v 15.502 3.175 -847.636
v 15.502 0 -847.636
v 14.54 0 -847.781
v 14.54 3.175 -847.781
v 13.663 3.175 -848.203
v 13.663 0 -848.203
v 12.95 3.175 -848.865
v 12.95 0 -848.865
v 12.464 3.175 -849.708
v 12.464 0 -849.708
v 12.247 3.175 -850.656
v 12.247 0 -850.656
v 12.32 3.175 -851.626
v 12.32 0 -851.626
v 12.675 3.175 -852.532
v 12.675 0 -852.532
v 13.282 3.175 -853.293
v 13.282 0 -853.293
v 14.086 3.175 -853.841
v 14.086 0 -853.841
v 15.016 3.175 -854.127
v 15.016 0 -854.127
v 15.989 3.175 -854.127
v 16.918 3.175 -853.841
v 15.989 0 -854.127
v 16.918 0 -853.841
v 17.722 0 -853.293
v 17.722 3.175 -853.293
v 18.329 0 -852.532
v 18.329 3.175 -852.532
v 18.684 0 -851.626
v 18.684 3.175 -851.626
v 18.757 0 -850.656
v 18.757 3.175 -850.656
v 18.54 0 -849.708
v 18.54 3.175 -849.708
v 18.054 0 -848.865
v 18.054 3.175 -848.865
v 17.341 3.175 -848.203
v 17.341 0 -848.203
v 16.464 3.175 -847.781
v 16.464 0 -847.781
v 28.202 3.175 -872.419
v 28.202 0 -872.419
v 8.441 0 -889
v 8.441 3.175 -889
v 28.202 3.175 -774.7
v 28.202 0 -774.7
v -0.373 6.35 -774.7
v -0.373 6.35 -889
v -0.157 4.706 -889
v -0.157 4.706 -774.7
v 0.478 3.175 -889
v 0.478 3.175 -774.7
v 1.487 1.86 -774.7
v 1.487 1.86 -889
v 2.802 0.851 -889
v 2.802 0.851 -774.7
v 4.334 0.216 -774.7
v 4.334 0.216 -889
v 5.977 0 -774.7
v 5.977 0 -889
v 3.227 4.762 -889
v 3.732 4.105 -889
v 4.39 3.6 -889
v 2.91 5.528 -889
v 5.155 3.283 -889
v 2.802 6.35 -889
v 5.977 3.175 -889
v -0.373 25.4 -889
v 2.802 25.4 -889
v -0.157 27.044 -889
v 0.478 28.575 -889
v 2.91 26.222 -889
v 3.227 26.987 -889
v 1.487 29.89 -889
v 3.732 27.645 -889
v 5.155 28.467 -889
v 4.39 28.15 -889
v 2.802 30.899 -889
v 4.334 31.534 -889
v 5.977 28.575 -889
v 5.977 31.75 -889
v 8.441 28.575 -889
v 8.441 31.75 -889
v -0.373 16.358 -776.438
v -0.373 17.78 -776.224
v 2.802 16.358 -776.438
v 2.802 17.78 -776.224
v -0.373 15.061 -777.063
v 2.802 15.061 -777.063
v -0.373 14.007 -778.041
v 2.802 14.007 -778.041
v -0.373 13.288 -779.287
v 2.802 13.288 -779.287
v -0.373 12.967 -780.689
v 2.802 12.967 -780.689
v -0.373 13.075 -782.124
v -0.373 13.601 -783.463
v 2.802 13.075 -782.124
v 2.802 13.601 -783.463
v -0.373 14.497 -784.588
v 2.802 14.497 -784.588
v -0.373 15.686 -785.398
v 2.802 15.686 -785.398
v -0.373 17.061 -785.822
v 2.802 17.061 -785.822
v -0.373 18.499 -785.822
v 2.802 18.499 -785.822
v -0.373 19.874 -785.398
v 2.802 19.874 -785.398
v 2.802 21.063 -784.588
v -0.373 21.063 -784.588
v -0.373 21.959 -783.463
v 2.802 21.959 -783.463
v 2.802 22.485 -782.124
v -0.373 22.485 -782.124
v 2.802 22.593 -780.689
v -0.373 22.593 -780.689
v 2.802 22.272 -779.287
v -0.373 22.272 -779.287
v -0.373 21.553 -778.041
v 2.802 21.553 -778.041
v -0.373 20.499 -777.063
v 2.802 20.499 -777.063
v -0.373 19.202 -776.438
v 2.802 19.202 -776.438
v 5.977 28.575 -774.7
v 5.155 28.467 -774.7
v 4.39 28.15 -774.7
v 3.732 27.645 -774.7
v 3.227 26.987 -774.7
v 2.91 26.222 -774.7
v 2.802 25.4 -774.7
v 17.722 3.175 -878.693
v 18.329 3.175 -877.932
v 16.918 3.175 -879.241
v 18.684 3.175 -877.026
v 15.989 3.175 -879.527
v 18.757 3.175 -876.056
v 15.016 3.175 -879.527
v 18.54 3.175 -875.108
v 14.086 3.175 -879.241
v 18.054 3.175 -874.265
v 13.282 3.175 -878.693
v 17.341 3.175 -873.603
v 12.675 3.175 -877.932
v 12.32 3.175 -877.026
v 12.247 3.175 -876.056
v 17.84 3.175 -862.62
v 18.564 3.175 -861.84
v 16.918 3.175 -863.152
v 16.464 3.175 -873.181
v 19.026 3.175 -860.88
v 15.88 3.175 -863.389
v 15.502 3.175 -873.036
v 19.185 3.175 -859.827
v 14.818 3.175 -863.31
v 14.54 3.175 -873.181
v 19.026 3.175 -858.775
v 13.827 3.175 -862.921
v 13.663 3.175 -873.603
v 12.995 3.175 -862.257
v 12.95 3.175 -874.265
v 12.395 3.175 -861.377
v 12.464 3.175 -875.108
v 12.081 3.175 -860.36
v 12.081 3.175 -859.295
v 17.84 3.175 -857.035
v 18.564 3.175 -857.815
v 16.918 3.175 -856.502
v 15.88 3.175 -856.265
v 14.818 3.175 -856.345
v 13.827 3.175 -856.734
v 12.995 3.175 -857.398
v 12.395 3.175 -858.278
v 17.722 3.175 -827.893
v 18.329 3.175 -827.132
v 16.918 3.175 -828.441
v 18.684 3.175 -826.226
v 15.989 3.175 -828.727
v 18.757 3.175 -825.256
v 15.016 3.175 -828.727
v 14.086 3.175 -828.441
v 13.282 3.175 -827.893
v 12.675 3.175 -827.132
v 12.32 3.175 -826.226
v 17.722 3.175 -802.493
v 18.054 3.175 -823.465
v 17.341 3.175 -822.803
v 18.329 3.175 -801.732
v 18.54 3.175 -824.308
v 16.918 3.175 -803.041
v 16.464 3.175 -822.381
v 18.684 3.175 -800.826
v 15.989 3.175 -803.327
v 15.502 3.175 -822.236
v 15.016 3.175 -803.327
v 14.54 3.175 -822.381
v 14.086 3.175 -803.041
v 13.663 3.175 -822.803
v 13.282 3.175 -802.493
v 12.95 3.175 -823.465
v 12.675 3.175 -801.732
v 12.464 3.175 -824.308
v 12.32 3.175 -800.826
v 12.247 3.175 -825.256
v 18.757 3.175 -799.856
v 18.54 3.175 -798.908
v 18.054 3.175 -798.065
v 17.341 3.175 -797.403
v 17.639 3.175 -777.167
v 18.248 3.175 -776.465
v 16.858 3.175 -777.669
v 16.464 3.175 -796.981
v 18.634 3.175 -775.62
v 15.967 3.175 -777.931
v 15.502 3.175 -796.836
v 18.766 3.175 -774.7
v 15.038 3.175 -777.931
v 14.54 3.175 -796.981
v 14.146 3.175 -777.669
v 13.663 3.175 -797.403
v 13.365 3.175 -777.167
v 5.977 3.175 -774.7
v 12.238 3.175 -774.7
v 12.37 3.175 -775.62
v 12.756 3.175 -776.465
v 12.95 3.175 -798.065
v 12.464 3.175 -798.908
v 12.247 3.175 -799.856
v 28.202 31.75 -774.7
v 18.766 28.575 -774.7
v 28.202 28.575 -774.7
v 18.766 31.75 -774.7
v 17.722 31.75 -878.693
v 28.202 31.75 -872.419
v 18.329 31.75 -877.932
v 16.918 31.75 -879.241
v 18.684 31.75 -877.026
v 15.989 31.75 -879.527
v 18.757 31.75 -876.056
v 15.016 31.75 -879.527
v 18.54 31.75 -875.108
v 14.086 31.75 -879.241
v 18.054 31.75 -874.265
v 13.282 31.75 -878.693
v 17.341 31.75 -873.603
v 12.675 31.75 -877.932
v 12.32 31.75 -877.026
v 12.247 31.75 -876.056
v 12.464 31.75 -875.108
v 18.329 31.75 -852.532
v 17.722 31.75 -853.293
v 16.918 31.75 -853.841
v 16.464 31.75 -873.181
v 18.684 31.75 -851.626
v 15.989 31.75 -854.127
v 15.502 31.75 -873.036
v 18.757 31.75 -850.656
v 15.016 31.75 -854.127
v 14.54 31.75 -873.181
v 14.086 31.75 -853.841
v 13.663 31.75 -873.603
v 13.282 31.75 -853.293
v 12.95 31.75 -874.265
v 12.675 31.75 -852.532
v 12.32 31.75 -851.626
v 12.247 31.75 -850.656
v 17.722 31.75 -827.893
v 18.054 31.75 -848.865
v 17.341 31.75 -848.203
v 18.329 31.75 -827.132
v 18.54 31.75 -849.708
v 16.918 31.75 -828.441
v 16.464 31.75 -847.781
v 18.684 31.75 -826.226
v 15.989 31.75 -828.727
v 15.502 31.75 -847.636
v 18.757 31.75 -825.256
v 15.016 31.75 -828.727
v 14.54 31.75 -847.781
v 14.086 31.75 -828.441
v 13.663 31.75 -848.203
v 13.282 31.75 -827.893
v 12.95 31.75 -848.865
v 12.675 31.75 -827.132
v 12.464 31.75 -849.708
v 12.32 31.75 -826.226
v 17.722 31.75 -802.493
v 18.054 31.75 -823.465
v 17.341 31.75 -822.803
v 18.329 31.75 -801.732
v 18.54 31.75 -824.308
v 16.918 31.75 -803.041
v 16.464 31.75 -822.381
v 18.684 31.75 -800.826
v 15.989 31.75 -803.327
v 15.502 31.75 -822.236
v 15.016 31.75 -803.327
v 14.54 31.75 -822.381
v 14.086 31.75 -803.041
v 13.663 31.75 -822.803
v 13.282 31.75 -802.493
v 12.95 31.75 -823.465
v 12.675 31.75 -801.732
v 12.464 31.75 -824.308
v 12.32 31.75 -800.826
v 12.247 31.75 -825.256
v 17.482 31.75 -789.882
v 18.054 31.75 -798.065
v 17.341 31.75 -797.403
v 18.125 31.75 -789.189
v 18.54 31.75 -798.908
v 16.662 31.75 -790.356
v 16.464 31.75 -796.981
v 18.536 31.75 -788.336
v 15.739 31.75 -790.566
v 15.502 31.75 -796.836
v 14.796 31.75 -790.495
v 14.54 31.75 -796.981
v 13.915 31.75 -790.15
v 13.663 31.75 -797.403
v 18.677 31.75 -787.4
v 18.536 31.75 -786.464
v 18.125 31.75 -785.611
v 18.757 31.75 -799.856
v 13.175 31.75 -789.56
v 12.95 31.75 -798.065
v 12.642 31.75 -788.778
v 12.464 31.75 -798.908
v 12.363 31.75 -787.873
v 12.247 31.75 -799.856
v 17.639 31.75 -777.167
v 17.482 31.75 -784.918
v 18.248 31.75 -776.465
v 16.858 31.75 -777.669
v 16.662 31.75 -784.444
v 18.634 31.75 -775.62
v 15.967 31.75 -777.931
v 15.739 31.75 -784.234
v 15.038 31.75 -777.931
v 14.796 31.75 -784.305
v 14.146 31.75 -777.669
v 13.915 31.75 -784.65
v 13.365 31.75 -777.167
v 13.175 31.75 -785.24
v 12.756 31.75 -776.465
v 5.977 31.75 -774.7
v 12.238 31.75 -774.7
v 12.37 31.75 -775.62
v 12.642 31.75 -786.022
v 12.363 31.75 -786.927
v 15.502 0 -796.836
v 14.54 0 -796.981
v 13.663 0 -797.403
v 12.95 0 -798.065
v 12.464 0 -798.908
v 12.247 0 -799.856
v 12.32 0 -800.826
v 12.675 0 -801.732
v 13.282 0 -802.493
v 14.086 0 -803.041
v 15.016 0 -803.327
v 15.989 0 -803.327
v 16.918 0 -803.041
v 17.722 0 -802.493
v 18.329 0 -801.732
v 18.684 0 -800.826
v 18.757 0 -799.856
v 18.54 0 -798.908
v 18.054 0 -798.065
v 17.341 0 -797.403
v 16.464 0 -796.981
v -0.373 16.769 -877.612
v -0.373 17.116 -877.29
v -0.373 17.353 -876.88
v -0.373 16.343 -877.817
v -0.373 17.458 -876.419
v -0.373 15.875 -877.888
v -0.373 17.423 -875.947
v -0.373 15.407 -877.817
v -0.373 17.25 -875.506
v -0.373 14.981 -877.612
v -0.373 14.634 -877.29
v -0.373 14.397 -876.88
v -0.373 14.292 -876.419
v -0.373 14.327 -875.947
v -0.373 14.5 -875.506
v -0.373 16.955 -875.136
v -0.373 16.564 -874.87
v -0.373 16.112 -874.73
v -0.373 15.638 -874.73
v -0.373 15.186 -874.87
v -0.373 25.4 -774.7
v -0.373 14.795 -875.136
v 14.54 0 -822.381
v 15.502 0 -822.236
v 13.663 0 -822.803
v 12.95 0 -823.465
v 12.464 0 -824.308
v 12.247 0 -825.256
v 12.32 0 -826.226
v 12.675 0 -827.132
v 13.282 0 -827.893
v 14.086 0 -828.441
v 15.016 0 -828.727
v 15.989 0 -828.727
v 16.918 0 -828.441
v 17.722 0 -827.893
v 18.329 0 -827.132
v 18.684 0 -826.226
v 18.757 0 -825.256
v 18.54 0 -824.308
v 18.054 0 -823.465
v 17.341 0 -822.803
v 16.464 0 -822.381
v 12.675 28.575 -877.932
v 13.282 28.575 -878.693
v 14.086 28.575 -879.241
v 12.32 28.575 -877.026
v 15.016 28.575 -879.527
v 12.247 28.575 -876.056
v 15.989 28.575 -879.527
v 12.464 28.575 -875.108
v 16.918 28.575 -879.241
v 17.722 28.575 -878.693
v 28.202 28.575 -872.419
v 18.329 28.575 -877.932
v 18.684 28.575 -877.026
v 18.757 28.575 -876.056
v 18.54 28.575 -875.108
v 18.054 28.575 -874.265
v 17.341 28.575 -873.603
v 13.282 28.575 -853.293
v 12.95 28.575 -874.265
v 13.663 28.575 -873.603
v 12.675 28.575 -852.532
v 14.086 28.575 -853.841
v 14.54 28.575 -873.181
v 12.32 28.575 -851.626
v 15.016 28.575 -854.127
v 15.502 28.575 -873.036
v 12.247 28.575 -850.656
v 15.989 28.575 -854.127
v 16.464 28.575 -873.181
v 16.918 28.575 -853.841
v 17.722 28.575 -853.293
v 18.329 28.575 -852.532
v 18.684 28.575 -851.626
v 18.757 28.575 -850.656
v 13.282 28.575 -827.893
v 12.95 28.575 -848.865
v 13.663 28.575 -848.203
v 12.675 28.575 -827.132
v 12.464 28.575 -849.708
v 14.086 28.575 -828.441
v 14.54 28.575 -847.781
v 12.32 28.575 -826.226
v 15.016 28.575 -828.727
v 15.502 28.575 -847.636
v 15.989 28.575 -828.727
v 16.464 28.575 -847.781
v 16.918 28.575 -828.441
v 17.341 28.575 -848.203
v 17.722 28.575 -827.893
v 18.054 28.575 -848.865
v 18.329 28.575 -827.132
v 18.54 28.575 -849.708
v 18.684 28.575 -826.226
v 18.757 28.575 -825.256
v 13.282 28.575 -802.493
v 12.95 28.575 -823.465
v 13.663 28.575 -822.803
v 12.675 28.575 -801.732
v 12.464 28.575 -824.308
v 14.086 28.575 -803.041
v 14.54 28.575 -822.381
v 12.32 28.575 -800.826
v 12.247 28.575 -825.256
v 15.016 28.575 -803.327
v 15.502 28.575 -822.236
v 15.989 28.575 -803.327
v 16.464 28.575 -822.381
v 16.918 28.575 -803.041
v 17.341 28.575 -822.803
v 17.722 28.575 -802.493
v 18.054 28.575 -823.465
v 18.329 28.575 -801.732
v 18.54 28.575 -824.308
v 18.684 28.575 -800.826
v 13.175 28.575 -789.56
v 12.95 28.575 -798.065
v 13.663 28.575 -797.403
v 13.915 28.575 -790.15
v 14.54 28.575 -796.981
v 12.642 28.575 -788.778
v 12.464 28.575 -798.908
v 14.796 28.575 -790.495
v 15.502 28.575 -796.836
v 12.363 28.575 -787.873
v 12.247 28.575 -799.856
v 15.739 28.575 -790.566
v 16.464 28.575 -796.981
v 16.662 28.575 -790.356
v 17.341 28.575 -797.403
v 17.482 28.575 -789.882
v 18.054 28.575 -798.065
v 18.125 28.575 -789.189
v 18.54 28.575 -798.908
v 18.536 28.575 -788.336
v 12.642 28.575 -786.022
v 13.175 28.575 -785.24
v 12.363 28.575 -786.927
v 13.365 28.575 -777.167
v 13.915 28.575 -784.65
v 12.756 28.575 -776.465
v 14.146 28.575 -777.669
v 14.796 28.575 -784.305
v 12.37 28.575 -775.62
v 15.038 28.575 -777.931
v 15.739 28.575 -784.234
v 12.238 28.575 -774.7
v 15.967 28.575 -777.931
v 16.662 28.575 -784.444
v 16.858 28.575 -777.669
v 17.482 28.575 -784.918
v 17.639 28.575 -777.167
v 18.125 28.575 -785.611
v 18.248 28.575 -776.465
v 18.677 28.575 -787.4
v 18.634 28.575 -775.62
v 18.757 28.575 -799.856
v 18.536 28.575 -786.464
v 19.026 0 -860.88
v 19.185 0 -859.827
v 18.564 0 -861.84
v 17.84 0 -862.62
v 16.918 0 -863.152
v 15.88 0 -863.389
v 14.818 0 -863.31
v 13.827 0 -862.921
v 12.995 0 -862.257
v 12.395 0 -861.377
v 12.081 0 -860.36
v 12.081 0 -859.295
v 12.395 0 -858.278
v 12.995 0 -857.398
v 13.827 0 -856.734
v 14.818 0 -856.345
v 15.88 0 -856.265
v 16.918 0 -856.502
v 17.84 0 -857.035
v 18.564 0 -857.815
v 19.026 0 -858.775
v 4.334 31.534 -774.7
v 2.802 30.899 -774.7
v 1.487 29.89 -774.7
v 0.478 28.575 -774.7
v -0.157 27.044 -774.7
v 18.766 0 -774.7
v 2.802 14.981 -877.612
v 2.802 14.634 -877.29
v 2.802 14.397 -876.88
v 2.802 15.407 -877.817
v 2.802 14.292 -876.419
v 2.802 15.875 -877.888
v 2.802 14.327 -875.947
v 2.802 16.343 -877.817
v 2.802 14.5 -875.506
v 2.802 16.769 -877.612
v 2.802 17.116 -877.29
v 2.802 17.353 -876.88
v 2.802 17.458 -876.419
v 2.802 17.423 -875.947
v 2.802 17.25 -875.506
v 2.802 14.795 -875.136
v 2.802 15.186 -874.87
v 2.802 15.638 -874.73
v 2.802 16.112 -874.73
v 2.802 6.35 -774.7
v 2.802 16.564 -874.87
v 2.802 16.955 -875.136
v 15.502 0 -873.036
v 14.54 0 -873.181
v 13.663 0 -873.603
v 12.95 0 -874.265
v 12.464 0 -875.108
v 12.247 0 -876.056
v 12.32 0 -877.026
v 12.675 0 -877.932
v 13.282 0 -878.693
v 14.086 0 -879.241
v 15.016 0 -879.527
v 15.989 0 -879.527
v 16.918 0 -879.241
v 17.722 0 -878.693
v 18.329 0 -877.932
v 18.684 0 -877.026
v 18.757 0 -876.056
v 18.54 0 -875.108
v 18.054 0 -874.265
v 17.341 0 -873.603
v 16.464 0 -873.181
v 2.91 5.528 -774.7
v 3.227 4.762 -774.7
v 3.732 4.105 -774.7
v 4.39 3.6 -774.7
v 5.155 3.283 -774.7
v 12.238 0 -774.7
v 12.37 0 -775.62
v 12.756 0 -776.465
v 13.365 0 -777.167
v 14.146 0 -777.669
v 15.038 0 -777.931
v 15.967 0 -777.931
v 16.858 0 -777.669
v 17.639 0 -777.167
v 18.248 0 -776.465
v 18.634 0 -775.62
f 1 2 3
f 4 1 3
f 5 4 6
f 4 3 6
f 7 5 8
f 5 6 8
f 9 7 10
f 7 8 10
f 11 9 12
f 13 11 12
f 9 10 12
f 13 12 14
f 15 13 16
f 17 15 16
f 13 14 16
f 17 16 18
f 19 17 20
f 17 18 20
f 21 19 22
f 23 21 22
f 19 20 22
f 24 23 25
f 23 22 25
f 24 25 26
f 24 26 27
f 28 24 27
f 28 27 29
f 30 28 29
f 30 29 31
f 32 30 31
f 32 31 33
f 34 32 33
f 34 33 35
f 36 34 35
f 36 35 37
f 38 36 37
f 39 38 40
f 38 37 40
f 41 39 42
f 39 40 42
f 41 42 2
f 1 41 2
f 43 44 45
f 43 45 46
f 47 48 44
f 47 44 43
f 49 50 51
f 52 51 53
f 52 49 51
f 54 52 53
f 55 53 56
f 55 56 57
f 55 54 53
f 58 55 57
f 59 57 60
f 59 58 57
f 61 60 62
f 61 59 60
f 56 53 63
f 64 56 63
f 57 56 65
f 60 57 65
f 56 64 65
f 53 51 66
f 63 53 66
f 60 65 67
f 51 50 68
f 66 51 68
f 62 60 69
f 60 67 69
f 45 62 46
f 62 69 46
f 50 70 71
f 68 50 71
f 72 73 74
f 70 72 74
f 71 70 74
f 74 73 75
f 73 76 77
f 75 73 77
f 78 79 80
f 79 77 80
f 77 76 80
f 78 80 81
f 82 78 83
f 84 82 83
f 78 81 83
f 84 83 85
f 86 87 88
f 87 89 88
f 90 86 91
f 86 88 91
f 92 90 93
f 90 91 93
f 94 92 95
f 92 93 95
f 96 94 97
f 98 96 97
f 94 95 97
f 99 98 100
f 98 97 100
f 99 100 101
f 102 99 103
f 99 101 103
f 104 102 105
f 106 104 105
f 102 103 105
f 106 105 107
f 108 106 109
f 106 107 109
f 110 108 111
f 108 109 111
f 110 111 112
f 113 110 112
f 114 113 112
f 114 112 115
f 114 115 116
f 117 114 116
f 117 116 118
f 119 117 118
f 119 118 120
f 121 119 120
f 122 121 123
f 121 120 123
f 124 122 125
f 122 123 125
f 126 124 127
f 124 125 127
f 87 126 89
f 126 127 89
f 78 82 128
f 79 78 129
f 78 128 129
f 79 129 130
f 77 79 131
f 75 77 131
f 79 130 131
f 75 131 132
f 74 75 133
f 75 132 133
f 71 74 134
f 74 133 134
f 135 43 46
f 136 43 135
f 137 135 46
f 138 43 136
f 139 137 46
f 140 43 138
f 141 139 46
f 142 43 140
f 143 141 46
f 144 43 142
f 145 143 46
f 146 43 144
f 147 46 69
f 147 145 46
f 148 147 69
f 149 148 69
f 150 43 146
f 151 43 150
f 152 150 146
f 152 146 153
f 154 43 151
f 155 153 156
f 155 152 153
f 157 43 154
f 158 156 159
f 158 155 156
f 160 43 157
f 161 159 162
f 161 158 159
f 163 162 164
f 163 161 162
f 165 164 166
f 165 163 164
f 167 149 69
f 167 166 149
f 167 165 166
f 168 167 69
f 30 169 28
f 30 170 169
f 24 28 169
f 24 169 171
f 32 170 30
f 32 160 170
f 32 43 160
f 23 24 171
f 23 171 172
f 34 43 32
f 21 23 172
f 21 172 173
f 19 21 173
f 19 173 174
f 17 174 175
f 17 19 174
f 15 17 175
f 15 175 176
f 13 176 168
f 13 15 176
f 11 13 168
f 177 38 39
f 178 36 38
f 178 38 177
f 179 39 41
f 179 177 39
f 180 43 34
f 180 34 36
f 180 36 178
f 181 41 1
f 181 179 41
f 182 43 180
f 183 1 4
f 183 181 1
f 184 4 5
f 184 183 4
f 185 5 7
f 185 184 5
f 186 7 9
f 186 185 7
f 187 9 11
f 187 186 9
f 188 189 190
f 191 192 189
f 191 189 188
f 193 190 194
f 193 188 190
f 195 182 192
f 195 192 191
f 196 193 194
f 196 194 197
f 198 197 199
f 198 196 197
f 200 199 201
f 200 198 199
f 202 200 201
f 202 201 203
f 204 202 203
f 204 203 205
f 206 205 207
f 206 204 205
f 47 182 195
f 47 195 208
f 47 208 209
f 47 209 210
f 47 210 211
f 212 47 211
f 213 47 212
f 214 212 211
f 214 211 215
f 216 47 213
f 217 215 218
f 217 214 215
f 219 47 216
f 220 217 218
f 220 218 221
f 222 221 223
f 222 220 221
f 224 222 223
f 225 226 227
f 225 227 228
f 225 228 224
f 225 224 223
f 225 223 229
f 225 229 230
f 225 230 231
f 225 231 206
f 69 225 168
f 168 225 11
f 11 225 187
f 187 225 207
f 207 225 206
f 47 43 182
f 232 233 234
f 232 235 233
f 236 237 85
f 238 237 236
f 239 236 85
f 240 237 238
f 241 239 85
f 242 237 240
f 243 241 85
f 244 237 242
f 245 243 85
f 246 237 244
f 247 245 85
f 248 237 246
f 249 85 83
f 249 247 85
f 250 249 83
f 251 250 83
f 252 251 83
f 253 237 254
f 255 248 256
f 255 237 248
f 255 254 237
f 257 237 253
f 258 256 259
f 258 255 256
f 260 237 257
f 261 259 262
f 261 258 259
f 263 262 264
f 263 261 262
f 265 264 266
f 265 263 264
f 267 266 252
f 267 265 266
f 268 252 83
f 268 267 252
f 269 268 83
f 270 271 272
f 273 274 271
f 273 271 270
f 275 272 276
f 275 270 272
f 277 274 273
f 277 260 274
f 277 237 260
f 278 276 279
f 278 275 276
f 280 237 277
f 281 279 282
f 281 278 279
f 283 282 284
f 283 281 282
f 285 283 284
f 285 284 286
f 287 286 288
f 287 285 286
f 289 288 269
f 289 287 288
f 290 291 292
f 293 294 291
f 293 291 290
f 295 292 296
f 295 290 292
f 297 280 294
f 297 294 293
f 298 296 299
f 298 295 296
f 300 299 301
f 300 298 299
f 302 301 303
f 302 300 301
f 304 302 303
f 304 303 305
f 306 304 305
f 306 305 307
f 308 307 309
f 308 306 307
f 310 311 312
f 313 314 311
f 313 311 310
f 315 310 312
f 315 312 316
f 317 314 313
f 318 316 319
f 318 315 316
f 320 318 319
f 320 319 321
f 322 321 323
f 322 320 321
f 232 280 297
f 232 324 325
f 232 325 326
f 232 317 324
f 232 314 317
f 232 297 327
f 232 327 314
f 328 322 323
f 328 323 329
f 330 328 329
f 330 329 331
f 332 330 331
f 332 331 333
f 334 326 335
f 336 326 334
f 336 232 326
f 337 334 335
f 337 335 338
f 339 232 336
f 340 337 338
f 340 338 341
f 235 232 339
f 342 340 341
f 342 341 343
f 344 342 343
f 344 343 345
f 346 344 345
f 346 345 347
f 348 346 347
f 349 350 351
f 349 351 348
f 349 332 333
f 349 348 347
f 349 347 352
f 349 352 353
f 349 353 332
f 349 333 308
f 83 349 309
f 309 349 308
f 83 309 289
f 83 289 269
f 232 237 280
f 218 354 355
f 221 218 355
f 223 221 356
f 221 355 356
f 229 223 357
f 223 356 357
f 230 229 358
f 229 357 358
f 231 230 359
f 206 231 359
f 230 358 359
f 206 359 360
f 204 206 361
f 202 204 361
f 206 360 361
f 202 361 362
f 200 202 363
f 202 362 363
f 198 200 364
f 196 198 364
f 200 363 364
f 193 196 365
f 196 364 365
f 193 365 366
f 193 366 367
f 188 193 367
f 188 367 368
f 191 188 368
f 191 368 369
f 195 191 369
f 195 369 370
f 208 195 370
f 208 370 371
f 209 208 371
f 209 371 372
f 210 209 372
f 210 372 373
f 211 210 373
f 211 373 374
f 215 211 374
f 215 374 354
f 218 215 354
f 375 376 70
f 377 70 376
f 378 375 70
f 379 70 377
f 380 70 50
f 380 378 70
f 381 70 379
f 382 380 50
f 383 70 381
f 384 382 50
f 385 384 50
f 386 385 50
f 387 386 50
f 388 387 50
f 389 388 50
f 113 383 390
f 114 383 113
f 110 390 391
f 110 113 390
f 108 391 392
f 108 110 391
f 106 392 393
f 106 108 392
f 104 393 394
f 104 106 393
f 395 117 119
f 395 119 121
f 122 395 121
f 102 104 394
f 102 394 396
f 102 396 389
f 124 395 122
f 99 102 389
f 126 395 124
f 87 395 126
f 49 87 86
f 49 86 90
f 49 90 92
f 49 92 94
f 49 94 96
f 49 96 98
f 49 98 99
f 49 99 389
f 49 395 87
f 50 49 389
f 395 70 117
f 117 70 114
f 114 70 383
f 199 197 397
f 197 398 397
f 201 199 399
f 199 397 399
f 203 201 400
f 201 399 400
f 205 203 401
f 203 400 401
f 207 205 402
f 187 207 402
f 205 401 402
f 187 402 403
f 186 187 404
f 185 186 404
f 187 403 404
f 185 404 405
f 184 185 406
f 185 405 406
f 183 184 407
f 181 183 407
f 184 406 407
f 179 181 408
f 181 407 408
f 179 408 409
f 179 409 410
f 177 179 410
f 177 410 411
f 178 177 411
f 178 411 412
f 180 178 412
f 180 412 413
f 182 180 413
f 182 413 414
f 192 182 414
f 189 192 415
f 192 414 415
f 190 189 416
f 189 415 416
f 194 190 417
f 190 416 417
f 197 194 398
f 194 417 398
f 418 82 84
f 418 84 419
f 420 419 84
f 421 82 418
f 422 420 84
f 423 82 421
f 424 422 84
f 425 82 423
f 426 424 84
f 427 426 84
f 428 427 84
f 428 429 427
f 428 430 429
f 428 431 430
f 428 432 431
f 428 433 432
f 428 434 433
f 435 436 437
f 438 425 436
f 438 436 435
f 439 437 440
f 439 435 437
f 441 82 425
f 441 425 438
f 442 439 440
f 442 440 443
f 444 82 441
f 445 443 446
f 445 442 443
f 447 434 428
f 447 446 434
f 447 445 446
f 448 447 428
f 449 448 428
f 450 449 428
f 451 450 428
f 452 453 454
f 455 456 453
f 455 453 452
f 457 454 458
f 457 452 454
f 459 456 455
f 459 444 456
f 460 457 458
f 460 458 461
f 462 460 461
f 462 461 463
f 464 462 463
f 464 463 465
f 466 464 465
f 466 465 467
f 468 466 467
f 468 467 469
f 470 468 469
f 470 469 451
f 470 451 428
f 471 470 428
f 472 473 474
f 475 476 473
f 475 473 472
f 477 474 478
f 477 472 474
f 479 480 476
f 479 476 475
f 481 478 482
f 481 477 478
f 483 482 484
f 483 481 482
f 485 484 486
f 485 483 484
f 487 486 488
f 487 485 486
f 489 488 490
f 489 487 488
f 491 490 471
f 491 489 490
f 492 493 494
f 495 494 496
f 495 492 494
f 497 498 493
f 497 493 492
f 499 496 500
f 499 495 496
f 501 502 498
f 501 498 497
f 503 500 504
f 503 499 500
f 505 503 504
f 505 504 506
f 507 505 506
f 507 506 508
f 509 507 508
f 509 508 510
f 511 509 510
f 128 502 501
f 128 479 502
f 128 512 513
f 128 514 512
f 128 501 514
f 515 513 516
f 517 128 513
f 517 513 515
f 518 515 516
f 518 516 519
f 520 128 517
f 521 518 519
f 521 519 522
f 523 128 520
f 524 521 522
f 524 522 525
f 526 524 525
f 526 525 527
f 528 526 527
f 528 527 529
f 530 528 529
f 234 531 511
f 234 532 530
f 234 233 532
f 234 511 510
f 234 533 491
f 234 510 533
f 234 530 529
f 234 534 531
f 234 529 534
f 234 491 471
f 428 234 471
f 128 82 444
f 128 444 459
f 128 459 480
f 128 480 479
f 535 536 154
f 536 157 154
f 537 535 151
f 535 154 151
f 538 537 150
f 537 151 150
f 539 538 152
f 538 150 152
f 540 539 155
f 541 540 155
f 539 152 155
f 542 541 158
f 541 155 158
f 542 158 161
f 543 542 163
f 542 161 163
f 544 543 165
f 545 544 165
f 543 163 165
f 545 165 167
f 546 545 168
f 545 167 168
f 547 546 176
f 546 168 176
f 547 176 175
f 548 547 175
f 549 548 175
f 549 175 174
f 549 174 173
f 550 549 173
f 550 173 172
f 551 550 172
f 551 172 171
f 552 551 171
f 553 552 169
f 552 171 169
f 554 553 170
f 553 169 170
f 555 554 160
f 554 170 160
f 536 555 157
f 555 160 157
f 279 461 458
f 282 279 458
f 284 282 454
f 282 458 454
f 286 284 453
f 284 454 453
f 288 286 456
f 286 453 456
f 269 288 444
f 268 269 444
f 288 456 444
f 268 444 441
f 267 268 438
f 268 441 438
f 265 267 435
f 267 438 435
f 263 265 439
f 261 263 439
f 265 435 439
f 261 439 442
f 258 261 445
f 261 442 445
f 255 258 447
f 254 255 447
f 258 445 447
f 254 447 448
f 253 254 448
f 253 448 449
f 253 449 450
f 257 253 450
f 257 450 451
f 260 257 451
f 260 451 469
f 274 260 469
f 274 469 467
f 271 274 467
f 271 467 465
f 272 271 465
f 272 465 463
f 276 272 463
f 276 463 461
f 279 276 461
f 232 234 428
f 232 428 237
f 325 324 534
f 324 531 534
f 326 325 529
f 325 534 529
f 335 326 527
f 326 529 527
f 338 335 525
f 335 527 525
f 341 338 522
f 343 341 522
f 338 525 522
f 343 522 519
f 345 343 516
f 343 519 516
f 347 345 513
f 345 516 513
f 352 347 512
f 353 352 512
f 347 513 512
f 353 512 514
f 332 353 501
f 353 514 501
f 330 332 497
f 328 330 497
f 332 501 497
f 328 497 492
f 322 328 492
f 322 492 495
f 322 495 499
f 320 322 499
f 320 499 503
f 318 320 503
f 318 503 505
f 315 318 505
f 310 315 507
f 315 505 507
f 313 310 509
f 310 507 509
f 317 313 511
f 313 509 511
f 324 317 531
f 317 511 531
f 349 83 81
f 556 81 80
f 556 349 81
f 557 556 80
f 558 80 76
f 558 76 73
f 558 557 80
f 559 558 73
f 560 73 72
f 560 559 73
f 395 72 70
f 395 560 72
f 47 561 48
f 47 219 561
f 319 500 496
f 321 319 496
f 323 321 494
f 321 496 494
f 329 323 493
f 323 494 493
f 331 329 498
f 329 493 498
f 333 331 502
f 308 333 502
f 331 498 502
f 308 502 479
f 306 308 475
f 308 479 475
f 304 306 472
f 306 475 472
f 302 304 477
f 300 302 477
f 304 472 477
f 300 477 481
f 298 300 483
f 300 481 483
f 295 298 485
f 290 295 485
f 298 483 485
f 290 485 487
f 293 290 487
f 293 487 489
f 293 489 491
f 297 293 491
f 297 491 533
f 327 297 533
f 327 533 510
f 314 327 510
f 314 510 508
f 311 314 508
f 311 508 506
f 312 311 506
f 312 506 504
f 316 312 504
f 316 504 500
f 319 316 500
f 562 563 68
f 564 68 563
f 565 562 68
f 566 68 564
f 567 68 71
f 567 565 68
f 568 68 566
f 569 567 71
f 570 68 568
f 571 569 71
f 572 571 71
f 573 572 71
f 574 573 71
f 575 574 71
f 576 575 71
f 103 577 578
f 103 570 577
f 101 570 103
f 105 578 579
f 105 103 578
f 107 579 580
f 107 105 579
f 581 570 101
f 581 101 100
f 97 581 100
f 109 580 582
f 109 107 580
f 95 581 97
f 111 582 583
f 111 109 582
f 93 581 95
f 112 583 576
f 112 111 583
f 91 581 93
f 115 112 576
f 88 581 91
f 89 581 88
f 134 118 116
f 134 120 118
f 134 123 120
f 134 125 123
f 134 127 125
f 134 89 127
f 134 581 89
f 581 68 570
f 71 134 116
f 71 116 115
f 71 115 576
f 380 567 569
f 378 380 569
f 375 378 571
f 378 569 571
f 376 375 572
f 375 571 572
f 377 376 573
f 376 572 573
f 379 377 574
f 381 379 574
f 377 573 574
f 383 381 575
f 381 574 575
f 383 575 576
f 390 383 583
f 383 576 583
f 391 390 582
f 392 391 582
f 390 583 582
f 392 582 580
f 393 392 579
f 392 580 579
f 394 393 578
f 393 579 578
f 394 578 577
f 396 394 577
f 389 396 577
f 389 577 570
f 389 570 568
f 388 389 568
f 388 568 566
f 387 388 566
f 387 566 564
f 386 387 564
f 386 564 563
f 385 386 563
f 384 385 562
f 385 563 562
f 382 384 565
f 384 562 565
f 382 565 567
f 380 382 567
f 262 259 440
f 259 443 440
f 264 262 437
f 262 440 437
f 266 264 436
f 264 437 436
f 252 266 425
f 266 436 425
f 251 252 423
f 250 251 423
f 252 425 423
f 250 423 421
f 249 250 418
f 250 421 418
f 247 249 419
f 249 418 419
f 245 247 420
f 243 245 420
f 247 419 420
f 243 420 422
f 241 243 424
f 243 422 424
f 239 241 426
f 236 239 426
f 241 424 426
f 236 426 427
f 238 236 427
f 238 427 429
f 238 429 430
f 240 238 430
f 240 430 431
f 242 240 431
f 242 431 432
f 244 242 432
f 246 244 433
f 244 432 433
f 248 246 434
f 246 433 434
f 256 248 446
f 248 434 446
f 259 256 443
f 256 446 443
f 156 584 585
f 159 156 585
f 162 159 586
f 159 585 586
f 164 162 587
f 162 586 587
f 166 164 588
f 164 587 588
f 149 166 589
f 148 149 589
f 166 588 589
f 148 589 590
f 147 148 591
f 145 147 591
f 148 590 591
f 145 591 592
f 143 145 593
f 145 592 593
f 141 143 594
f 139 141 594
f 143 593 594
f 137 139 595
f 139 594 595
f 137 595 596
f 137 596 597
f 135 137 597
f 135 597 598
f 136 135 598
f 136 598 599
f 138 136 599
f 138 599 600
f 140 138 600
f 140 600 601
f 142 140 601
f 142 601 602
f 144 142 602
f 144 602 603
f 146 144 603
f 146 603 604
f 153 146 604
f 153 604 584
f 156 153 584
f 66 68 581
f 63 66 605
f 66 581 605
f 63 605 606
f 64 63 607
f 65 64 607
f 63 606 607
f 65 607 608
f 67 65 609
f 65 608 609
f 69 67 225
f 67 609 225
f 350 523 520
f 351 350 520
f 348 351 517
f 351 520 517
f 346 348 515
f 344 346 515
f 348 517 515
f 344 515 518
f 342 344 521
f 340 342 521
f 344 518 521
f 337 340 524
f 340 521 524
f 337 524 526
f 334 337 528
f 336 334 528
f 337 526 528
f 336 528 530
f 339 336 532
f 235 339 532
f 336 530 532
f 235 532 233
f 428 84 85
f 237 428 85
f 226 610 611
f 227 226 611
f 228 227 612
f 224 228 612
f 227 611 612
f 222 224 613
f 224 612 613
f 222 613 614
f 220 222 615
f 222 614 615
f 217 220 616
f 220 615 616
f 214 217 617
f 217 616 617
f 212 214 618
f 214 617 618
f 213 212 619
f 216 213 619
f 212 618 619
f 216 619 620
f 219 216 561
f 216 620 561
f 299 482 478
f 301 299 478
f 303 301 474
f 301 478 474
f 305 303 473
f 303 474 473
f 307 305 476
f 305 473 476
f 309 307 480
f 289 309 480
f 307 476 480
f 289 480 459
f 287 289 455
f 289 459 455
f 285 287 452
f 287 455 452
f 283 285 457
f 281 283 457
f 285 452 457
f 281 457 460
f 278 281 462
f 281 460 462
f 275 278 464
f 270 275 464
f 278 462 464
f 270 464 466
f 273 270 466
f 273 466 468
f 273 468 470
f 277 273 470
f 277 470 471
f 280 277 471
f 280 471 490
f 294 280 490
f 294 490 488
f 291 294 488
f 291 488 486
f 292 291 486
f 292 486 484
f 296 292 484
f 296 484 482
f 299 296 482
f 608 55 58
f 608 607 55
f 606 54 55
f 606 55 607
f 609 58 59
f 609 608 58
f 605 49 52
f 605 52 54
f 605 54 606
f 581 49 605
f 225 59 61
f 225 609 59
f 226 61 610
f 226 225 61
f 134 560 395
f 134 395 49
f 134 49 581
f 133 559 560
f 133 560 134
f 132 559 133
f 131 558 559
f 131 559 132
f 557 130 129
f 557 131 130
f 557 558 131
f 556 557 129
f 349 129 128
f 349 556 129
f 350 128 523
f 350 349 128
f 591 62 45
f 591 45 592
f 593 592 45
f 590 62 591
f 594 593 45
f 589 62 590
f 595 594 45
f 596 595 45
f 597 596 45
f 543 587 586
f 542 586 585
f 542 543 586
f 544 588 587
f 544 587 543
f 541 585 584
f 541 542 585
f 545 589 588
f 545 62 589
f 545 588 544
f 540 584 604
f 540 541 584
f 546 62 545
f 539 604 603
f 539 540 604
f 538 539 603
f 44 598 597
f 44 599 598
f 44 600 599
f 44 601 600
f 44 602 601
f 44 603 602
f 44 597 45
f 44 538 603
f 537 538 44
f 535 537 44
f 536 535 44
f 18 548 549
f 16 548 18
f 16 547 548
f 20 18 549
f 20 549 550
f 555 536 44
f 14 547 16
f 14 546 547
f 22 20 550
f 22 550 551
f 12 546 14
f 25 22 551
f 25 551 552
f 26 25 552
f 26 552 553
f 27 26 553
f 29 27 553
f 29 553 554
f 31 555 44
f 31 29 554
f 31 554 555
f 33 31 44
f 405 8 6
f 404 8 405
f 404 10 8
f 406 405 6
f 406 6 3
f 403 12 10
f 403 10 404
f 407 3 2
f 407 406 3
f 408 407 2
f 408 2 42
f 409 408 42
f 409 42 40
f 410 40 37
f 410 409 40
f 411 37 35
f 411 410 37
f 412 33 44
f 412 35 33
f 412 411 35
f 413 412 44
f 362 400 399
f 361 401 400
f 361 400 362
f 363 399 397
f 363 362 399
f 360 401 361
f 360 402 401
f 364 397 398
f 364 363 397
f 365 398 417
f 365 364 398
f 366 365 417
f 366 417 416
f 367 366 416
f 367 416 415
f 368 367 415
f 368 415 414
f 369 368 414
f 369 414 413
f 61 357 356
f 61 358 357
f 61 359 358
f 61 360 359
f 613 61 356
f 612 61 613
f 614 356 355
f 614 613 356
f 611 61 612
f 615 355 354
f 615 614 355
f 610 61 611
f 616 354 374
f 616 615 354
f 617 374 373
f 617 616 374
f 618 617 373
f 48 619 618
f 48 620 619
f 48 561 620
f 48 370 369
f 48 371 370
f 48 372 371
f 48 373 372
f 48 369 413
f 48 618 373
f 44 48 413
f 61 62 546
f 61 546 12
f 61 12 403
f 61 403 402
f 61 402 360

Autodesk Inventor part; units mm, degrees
ref_plane "YZ Plane" through (0, 0, 0) normal (1, 0, 0) x (0, 1, 0)
ref_plane "XZ Plane" through (0, 0, 0) normal (0, 1, 0) x (-1, 0, 0)
ref_plane "XY Plane" through (0, 0, 0) normal (0, 0, 1) x (1, 0, 0)
sketch "Sketch1" plane through (0, 0, 0) normal (0, 0, 1) x (1, 0, 0)
  line L0 (5.9771, 0) -> (28.2021, 0)
  line L1 (28.2021, 0) -> (28.2021, 3.175)
  line L2 (28.2021, 3.175) -> (5.9771, 3.175)
  line L3 (2.8021, 6.35) -> (2.8021, 25.4)
  line L4 (5.9771, 28.575) -> (28.2021, 28.575)
  line L5 (28.2021, 28.575) -> (28.2021, 31.75)
  line L6 (28.2021, 31.75) -> (5.9771, 31.75)
  line L7 (-0.3729, 25.4) -> (-0.3729, 6.35)
  arc A0 (5.9771, 28.575) -> (2.8021, 25.4) centre (5.9771, 25.4) ccw
  arc A1 (2.8021, 6.35) -> (5.9771, 3.175) centre (5.9771, 6.35) ccw
  arc A2 (5.9771, 31.75) -> (-0.3729, 25.4) centre (5.9771, 25.4) ccw
  arc A3 (-0.3729, 6.35) -> (5.9771, 0) centre (5.9771, 6.35) ccw
  point P0 (0, 0)
  point P1 (-0.3729, 0)
  point P2 (2.8021, 3.175)
  point P3 (2.8021, 28.575)
  dimension "d0" = 28.575
  dimension "d1" = 3.175
  dimension "d2" = 25.4
  dimension "d3" = 25.4
  dimension "d4" = 3.175
  dimension "d5" = 3.175
  dimension "d6" = 6.35
extrude "Extrusion1" add sketch "Sketch1" against normal blind 889
sketch "Sketch2" plane through (-0.3729, 6.35, 0) normal (-1, 0, 0) x (0, 0, 1)
  line L0 (0, 19.05) -> (-889, 19.05) projected
  line L1 (-228.6, 0) -> (-228.6, 7.9375)
  arc A0 (-228.6, 11.1125) -> (-228.6, 7.9375) centre (-228.6, 9.525) ccw
  line L2 (-228.6, 11.1125) -> (-228.6, 19.05)
  line L3 (-228.6, 19.05) -> (-889, 19.05)
  line L4 (-889, 0) -> (-889, 19.05)
  line L5 (-889, 0) -> (-228.6, 0)
  circle A1 centre (-552.45, 11.43) radius 4.826
  circle A2 centre (-501.65, 11.43) radius 4.826
  circle A3 centre (-387.35, 11.43) radius 4.826
  circle A4 centre (-336.55, 11.43) radius 4.826
  circle A5 centre (-444.5, 7.62) radius 4.826
  circle A6 centre (-730.25, 11.43) radius 4.826
  circle A7 centre (-781.05, 11.43) radius 4.826
  line L6 (0, 25.4) -> (-889, 25.4) construction
  circle A8 centre (-133.35, 11.43) radius 4.826
  circle A9 centre (-82.55, 11.43) radius 4.826
  point P0 (0, -6.35)
  point P1 (-254, 0.852)
  dimension "d10" = 7.62
  dimension "d11" = 3.81
  dimension "d14" = 254
hole "Hole1" at (-0.3729, 17.78, -781.05) at (-0.3729, 17.78, -730.25) at (-0.3729, 17.78, -552.45) at (-0.3729, 17.78, -501.65) at (-0.3729, 13.97, -444.5) at (-0.3729, 17.78, -387.35) at (-0.3729, 17.78, -336.55) at (-0.3729, 17.78, -133.35) at (-0.3729, 17.78, -82.55) direction (1, 0, 0) diameter 9.652 end through all
hole "Hole2" at (-0.3729, 15.875, -228.6) direction (1, 0, 0) diameter 3.175 end through all
sketch "Sketch3" plane through (5.9771, 31.75, 0) normal (0, 1, 0) x (1, 0, 0)
  line L0 (22.225, 889) -> (0, 889) projected
  line L1 (22.225, 0) -> (22.225, 889) projected
  point P0 (-5.9771, 0)
  point P1 (9.525, 876.3)
  dimension "d34" = 12.7
  dimension "d35" = 12.7
hole "Hole3" at (15.5021, 31.75, -876.3) direction (0, -1, 0) diameter 6.5278 end through all
pattern_linear "Rectangular Pattern1" count 35 spacing 25.4 along (0, 0, 1) of "Hole3"
sketch "Sketch4" plane through (0, 0, 0) normal (0, 0, 1) x (1, 0, 0)
  line L0 (28.2021, 0) -> (5.9771, 0) projected
  line L1 (28.2021, 3.175) -> (28.2021, 0) projected
  line L2 (5.9771, 3.175) -> (28.2021, 3.175) projected
  arc A0 (2.8021, 6.35) -> (5.9771, 3.175) centre (5.9771, 6.35) ccw projected
  line L3 (2.8021, 25.4) -> (2.8021, 6.35) projected
  arc A1 (5.9771, 28.575) -> (2.8021, 25.4) centre (5.9771, 25.4) ccw projected
  line L4 (28.2021, 28.575) -> (5.9771, 28.575) projected
  line L5 (28.2021, 31.75) -> (28.2021, 28.575) projected
  line L6 (5.9771, 31.75) -> (28.2021, 31.75) projected
  arc A2 (5.9771, 31.75) -> (-0.3729, 25.4) centre (5.9771, 25.4) ccw projected
  line L7 (-0.3729, 6.35) -> (-0.3729, 25.4) projected
  arc A3 (-0.3729, 6.35) -> (5.9771, 0) centre (5.9771, 6.35) ccw projected
  point P0 (0, 0)
extrude "Extrusion2" cut sketch "Sketch4" against normal blind 774.7
sketch "Sketch5" plane through (15.5021, 3.175, -774.7) normal (0, 1, 0) x (1, 0, 0)
  circle A0 centre (0.1108, 85.1274) radius 3.5719 projected
  circle A1 centre (0.1108, 85.1274) radius 14.2875 construction
  point P0 (-15.5021, -774.7)
extrude "Extrusion3" cut sketch "Sketch5" against normal through all
ref_plane "Work Plane1" through (28.2021, 31.75, -889) normal (0.6428, 0, -0.766) x (0, 1, 0)
sketch "Sketch6" plane through (28.2021, 31.75, -889) normal (0.6428, 0, -0.766) x (0, 1, 0)
  line L0 (-28.575, 73.4706) -> (-31.75, 73.4706) construction
  line L1 (-31.75, 73.4706) -> (-31.75, 0) construction
  line L2 (-31.75, 0) -> (-28.575, 0) construction
  line L3 (-28.575, 73.4706) -> (-28.575, 0) construction
  line L4 (0, 73.4706) -> (-3.175, 73.4706) construction
  line L5 (-3.175, 73.4706) -> (-3.175, 0) construction
  line L6 (-3.175, 0) -> (0, 0) construction
  line L7 (0, 73.4706) -> (0, 0) construction
  line L8 (-31.75, 0) -> (-28.575, 0) projected
  line L9 (-31.75, -17.0253) -> (-31.75, 0) projected
  ellipse E0 centre (-25.4, -17.0253) end of major axis (-19.05, -17.0253) minor radius 4.8644 (-31.75, -17.0253) -> (-25.4, -21.8897) ccw construction
  line L10 (-6.35, -21.8897) -> (-25.4, -21.8897) construction
  ellipse E1 centre (-6.35, -17.0253) end of major axis (-12.7, -17.0253) minor radius 4.8644 (-6.35, -21.8897) -> (0, -17.0253) ccw construction
  line L11 (0, 0) -> (0, -17.0253) projected
  line L12 (-3.175, 0) -> (0, 0) projected
  line L13 (-3.175, -17.0253) -> (-3.175, 0) construction
  ellipse E2 centre (-6.35, -17.0253) end of major axis (-3.175, -17.0253) minor radius 2.4322 (-6.35, -19.4575) -> (-3.175, -17.0253) ccw construction
  line L14 (-25.4, -19.4575) -> (-6.35, -19.4575) construction
  ellipse E3 centre (-25.4, -17.0253) end of major axis (-22.225, -17.0253) minor radius 2.4322 (-28.575, -17.0253) -> (-25.4, -19.4575) ccw construction
  line L15 (-28.575, 0) -> (-28.575, -17.0253) construction
  line L16 (-31.75, 19.05) -> (0, 19.05)
  line L17 (0, 19.05) -> (0, -31.75)
  line L18 (0, -31.75) -> (-31.75, -31.75)
  line L19 (-31.75, -31.75) -> (-31.75, 19.05)
  point P0 (-31.75, 549.8341)
  dimension "d54" = 31.75
  dimension "d55" = 50.8
  dimension "d56" = 19.05
extrude "Extrusion4" cut sketch "Sketch6" against normal blind 12.7
sketch "Sketch7" plane through (2.8021, 6.35, -774.7) normal (1, 0, 0) x (0, 0, -1)
  circle A0 centre (6.35, 11.43) radius 4.826 projected
  circle A1 centre (101.6, 9.525) radius 1.5875
  line L0 (6.35, 11.43) -> (101.6, 9.525) construction
  line L1 (114.3, 9.525) -> (101.6, 9.525) construction
  line L2 (114.3, 0) -> (114.3, 19.05) projected
  point P0 (-774.7, -6.35)
  dimension "d59" = 3.175
  dimension "d60" = 95.269
extrude "Extrusion5" cut sketch "Sketch7" against normal through all contours A1
sketch "Sketch8" plane through (15.5021, 28.575, -774.7) normal (0, -1, 0) x (1, 0, 0)
  circle A0 centre (0, -12.7) radius 3.175 projected
  circle A1 centre (24.765, -101.6) radius 3.175 construction
  circle A2 centre (-24.765, -101.6) radius 3.175 construction
  circle A3 centre (0, -101.6) radius 3.175 construction
  circle A4 centre (-24.765, -12.7) radius 3.175 construction
  circle A5 centre (24.765, -12.7) radius 3.175 construction
  line L0 (-37.465, -111.125) -> (-37.465, -3.175) construction
  line L1 (37.465, -111.125) -> (-37.465, -111.125) construction
  line L2 (37.465, -111.125) -> (37.465, -3.175) construction
  line L3 (-37.465, -3.175) -> (37.465, -3.175) construction
  point P0 (-15.5021, 774.7)
extrude "Extrusion6" cut sketch "Sketch8" against normal through all
equation "\"d35\" = d34"
properties part number "Chassis_Channel_AndyMark (4.5 inch)"
